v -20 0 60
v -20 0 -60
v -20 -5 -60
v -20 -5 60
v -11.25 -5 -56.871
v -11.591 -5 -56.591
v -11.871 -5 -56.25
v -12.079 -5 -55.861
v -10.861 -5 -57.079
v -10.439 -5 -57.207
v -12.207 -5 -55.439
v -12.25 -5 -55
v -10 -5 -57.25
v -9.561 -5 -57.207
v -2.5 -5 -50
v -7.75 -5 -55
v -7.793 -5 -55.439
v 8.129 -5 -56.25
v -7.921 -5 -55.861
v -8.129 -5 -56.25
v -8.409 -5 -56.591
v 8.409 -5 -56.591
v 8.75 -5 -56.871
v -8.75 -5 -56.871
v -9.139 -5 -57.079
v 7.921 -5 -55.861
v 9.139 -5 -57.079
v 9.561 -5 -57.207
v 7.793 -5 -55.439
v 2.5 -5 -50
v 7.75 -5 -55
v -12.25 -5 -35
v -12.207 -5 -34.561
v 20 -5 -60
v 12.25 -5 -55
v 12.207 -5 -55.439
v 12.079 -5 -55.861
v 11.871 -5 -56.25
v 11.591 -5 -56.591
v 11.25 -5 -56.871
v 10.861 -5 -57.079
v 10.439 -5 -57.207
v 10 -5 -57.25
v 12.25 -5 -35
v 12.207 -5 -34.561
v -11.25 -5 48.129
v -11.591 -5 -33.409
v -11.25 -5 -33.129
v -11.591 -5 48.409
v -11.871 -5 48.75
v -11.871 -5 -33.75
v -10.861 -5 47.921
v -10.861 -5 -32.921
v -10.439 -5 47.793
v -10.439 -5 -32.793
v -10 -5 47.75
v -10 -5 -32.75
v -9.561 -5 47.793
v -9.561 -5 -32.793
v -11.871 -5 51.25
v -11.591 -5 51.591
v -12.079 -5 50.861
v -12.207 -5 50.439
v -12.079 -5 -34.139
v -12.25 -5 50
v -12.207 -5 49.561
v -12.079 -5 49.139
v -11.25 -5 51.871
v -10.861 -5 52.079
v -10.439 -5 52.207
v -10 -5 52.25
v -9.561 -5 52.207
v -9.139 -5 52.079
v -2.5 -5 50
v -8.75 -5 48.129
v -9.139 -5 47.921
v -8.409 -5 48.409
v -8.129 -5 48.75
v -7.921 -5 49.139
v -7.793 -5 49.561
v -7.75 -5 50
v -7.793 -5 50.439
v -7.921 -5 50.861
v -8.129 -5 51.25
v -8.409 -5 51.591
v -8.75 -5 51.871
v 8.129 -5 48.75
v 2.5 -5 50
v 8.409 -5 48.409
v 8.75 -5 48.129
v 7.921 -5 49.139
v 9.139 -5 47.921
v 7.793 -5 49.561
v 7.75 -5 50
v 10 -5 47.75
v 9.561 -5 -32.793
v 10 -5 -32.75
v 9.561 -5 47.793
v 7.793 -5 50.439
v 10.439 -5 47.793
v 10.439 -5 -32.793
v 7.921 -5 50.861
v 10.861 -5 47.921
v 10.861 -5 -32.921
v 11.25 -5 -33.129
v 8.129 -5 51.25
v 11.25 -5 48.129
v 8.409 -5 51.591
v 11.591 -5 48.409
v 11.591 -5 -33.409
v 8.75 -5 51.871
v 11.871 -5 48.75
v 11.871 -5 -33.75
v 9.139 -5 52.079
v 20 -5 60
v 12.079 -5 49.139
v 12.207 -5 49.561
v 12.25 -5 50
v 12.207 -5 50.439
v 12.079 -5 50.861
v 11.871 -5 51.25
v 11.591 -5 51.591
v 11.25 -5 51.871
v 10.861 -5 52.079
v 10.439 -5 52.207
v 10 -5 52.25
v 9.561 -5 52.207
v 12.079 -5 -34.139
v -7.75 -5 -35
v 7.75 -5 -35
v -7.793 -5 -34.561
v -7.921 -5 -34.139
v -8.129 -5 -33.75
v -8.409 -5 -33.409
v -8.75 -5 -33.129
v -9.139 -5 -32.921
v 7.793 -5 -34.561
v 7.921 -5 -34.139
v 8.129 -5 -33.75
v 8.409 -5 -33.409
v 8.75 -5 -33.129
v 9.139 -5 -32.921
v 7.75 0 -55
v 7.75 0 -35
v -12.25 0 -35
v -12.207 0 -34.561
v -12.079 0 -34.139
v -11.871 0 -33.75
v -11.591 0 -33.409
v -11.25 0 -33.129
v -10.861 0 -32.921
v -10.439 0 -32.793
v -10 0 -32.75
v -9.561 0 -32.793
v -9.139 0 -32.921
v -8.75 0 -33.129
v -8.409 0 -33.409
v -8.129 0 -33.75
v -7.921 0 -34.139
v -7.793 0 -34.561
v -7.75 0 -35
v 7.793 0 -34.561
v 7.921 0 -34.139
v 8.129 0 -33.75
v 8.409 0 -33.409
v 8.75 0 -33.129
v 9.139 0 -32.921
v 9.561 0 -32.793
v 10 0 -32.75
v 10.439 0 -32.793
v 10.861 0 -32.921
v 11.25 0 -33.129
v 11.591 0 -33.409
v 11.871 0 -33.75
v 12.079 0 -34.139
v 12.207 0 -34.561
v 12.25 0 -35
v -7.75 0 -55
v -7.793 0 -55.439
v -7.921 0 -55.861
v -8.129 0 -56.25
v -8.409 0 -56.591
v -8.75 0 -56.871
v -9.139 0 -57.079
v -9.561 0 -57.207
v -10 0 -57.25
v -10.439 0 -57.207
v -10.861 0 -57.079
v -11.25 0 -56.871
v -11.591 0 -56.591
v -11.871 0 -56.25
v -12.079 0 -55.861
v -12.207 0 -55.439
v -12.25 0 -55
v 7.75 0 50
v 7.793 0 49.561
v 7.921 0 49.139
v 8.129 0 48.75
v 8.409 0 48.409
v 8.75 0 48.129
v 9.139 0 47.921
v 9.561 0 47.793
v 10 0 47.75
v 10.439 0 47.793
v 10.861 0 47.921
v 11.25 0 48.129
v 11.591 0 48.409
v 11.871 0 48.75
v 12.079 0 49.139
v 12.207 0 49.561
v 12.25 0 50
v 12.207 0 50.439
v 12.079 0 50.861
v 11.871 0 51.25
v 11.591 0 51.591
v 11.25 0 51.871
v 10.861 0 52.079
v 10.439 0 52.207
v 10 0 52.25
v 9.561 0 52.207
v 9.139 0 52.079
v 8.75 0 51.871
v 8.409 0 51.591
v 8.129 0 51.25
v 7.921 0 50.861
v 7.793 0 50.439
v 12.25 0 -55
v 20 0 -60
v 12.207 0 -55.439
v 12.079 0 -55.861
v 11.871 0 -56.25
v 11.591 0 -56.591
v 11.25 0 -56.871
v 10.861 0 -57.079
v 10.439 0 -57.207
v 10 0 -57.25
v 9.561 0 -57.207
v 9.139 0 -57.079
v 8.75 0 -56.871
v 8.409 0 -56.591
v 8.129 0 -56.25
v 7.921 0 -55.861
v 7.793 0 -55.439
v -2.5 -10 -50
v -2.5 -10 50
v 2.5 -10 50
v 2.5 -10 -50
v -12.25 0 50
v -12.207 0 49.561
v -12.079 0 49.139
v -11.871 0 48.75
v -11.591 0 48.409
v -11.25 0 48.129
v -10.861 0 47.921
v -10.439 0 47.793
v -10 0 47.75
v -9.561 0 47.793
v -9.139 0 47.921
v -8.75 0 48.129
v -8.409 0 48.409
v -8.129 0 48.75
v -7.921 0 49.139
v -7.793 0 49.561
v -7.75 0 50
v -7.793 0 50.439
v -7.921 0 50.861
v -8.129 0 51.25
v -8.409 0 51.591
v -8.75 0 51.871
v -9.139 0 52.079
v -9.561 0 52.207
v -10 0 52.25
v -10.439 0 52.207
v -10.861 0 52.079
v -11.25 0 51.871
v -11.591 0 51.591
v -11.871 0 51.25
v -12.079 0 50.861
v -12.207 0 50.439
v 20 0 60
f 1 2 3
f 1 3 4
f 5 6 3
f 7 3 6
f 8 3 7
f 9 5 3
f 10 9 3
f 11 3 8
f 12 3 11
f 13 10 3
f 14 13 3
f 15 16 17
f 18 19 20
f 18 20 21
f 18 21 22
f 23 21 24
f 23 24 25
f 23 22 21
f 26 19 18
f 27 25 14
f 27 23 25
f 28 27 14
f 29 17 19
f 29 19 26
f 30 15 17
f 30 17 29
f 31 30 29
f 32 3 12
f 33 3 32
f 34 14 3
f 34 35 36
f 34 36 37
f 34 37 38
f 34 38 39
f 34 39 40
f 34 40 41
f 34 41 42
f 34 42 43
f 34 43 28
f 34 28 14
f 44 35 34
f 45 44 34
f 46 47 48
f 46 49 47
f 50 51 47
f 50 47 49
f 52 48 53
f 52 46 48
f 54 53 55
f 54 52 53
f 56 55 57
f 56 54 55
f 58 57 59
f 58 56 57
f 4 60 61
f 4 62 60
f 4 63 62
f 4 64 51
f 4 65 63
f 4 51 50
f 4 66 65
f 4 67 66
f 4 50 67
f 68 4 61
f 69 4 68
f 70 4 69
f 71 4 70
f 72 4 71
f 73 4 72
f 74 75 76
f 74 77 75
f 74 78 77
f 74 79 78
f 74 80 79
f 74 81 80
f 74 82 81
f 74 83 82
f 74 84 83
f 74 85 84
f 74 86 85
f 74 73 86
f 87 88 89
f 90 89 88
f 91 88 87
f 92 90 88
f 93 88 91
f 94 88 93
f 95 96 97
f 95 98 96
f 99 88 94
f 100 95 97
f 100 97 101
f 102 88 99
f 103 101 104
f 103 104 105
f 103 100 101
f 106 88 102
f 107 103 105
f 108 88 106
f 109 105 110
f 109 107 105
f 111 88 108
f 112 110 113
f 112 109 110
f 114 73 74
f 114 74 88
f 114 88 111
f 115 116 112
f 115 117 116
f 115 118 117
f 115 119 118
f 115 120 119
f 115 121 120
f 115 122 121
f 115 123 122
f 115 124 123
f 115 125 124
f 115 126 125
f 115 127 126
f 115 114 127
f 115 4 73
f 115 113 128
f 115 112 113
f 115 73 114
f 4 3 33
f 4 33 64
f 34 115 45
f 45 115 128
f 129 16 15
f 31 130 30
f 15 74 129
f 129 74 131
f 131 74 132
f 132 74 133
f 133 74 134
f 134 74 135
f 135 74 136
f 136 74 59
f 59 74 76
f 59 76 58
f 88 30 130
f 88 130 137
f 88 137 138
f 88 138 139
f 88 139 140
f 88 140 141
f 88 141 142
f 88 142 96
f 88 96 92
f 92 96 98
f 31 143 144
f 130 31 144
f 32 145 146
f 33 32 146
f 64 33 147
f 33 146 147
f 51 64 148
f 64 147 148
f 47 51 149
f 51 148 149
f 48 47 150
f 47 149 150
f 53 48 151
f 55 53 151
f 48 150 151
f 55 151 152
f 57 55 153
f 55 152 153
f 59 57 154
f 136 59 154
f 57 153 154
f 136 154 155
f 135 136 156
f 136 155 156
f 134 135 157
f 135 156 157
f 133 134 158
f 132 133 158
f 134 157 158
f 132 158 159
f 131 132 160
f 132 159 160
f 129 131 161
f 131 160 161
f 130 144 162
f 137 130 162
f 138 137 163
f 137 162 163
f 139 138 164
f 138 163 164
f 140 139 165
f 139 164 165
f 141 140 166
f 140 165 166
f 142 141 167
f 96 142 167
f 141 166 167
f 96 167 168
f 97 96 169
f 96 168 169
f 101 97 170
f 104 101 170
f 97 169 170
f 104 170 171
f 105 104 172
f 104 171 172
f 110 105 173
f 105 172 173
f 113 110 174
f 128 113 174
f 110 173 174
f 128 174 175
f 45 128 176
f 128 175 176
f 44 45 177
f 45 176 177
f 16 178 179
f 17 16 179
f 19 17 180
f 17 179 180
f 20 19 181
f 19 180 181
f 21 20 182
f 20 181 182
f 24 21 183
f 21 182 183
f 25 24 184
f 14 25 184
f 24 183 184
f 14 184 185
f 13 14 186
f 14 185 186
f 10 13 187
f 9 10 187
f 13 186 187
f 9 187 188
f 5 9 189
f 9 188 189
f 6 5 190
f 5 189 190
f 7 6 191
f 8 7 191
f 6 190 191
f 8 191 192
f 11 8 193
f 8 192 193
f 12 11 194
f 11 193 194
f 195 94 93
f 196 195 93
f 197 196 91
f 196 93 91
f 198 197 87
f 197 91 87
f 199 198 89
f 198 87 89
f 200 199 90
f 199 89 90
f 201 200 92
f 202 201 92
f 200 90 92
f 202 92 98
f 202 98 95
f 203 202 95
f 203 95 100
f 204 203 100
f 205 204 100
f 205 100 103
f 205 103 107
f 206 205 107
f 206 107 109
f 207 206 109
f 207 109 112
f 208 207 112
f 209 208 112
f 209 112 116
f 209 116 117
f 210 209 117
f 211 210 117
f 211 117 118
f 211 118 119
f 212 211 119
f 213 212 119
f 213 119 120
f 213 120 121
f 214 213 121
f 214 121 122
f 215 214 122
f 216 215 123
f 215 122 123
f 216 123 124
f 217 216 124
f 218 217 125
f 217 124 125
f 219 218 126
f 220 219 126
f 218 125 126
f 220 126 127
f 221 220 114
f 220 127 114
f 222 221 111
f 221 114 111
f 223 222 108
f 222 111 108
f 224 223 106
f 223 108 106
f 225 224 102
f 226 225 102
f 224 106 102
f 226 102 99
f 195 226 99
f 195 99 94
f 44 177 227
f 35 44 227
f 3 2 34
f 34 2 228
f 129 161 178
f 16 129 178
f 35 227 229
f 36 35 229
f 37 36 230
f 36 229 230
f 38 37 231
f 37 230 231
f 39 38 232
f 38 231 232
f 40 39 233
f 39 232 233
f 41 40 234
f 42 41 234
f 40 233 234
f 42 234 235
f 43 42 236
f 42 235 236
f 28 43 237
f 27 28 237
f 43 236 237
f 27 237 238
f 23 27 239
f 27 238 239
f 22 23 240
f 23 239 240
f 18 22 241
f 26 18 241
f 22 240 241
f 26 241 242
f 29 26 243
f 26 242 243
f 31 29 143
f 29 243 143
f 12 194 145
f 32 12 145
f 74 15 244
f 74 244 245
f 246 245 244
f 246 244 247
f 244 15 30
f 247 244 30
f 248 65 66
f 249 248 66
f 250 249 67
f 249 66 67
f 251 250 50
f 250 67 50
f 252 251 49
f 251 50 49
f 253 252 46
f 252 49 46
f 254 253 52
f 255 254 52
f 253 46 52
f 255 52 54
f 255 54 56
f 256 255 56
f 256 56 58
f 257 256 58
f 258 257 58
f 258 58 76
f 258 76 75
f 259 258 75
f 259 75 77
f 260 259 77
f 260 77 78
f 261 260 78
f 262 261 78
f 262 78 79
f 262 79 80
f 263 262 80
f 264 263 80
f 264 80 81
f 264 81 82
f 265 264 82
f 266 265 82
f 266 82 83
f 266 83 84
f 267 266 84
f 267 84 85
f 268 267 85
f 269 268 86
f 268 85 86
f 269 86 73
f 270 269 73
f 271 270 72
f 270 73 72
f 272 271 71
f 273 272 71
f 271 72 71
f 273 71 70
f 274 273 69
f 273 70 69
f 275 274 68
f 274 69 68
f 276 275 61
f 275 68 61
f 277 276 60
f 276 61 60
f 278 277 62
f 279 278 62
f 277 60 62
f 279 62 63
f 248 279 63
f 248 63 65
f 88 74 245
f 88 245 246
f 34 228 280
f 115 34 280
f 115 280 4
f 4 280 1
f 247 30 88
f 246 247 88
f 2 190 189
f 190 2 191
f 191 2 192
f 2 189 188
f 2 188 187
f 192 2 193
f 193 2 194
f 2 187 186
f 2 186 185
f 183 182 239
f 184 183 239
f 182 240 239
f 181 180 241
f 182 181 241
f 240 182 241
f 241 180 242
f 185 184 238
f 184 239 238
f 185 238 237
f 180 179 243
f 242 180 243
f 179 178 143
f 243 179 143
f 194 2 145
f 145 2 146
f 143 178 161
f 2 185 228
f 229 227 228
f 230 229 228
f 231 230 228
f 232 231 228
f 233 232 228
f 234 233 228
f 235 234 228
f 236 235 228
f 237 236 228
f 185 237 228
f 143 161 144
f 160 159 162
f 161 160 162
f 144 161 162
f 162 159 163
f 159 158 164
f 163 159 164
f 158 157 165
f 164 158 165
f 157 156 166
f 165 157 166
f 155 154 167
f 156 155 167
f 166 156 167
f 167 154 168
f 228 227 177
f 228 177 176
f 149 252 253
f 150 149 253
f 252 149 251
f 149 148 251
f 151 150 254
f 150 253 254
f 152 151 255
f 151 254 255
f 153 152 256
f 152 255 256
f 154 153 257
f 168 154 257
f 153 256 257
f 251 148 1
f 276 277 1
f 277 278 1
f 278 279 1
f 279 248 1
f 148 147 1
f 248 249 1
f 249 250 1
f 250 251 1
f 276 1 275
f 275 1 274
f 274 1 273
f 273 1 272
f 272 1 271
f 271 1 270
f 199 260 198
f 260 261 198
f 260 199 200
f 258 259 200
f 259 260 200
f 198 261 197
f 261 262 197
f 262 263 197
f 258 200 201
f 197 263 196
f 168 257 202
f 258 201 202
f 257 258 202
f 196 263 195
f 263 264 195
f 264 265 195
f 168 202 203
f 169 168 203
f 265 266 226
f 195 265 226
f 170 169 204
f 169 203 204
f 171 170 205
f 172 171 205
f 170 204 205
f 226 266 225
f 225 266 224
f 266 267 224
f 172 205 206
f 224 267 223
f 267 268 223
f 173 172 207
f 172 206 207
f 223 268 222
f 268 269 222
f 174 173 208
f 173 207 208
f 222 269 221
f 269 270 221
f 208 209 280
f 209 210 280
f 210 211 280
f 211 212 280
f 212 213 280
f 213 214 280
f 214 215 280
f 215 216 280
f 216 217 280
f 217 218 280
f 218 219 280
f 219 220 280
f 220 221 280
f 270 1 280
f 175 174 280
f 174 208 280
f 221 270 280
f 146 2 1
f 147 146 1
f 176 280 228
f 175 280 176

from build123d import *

# Parameters (mm, degrees)
F0_W     = 17.5
F0_H     = 120
F0_W_2   = 5
F1_DEPTH = 5
F2_W     = 5
F2_H     = 100
F3_DEPTH = 5
F4_D     = 4.5
F4_DEPTH = 17
F4_TIP   = 1.3519363928


with BuildPart() as f1:
    # F0 (on Front) → F1 (new body)
    with BuildSketch(Plane.XZ):
        with Locations((-11.25, 0)):
            Rectangle(F0_W, F0_H)
        with BuildLine():
            Line((-7.75, -35), (-7.75, -55))
            ThreePointArc((-7.75, -55), (-10, -57.25), (-12.25, -55))
            Line((-12.25, -55), (-12.25, -35))
            ThreePointArc((-12.25, -35), (-10, -32.75), (-7.75, -35))
        make_face(mode=Mode.SUBTRACT)
        Rectangle(F0_W_2, F0_H)
        with Locations((11.25, 0)):
            Rectangle(F0_W, F0_H)
        with BuildLine():
            Line((12.25, -35), (12.25, -55))
            ThreePointArc((12.25, -55), (10, -57.25), (7.75, -55))
            Line((7.75, -55), (7.75, -35))
            ThreePointArc((7.75, -35), (10, -32.75), (12.25, -35))
        make_face(mode=Mode.SUBTRACT)
    extrude(amount=F1_DEPTH)

    # F2 (on face) → F3 (join)
    with BuildSketch(Plane.XZ.offset(5)):
        Rectangle(F2_W, F2_H)
    extrude(amount=F3_DEPTH)

    # F4
    with Locations(Plane(origin=(0, 0, 0), x_dir=(1, 0, 0), z_dir=(0, 1, 0))):
        with Locations((10, -50), (-10, -50)):
            Hole(F4_D / 2, depth=F4_DEPTH)
            with Locations((0, 0, -(F4_DEPTH + F4_TIP / 2))):  # 118° drill point
                Cone(0, F4_D / 2, F4_TIP, mode=Mode.SUBTRACT)


solid = f1.part
